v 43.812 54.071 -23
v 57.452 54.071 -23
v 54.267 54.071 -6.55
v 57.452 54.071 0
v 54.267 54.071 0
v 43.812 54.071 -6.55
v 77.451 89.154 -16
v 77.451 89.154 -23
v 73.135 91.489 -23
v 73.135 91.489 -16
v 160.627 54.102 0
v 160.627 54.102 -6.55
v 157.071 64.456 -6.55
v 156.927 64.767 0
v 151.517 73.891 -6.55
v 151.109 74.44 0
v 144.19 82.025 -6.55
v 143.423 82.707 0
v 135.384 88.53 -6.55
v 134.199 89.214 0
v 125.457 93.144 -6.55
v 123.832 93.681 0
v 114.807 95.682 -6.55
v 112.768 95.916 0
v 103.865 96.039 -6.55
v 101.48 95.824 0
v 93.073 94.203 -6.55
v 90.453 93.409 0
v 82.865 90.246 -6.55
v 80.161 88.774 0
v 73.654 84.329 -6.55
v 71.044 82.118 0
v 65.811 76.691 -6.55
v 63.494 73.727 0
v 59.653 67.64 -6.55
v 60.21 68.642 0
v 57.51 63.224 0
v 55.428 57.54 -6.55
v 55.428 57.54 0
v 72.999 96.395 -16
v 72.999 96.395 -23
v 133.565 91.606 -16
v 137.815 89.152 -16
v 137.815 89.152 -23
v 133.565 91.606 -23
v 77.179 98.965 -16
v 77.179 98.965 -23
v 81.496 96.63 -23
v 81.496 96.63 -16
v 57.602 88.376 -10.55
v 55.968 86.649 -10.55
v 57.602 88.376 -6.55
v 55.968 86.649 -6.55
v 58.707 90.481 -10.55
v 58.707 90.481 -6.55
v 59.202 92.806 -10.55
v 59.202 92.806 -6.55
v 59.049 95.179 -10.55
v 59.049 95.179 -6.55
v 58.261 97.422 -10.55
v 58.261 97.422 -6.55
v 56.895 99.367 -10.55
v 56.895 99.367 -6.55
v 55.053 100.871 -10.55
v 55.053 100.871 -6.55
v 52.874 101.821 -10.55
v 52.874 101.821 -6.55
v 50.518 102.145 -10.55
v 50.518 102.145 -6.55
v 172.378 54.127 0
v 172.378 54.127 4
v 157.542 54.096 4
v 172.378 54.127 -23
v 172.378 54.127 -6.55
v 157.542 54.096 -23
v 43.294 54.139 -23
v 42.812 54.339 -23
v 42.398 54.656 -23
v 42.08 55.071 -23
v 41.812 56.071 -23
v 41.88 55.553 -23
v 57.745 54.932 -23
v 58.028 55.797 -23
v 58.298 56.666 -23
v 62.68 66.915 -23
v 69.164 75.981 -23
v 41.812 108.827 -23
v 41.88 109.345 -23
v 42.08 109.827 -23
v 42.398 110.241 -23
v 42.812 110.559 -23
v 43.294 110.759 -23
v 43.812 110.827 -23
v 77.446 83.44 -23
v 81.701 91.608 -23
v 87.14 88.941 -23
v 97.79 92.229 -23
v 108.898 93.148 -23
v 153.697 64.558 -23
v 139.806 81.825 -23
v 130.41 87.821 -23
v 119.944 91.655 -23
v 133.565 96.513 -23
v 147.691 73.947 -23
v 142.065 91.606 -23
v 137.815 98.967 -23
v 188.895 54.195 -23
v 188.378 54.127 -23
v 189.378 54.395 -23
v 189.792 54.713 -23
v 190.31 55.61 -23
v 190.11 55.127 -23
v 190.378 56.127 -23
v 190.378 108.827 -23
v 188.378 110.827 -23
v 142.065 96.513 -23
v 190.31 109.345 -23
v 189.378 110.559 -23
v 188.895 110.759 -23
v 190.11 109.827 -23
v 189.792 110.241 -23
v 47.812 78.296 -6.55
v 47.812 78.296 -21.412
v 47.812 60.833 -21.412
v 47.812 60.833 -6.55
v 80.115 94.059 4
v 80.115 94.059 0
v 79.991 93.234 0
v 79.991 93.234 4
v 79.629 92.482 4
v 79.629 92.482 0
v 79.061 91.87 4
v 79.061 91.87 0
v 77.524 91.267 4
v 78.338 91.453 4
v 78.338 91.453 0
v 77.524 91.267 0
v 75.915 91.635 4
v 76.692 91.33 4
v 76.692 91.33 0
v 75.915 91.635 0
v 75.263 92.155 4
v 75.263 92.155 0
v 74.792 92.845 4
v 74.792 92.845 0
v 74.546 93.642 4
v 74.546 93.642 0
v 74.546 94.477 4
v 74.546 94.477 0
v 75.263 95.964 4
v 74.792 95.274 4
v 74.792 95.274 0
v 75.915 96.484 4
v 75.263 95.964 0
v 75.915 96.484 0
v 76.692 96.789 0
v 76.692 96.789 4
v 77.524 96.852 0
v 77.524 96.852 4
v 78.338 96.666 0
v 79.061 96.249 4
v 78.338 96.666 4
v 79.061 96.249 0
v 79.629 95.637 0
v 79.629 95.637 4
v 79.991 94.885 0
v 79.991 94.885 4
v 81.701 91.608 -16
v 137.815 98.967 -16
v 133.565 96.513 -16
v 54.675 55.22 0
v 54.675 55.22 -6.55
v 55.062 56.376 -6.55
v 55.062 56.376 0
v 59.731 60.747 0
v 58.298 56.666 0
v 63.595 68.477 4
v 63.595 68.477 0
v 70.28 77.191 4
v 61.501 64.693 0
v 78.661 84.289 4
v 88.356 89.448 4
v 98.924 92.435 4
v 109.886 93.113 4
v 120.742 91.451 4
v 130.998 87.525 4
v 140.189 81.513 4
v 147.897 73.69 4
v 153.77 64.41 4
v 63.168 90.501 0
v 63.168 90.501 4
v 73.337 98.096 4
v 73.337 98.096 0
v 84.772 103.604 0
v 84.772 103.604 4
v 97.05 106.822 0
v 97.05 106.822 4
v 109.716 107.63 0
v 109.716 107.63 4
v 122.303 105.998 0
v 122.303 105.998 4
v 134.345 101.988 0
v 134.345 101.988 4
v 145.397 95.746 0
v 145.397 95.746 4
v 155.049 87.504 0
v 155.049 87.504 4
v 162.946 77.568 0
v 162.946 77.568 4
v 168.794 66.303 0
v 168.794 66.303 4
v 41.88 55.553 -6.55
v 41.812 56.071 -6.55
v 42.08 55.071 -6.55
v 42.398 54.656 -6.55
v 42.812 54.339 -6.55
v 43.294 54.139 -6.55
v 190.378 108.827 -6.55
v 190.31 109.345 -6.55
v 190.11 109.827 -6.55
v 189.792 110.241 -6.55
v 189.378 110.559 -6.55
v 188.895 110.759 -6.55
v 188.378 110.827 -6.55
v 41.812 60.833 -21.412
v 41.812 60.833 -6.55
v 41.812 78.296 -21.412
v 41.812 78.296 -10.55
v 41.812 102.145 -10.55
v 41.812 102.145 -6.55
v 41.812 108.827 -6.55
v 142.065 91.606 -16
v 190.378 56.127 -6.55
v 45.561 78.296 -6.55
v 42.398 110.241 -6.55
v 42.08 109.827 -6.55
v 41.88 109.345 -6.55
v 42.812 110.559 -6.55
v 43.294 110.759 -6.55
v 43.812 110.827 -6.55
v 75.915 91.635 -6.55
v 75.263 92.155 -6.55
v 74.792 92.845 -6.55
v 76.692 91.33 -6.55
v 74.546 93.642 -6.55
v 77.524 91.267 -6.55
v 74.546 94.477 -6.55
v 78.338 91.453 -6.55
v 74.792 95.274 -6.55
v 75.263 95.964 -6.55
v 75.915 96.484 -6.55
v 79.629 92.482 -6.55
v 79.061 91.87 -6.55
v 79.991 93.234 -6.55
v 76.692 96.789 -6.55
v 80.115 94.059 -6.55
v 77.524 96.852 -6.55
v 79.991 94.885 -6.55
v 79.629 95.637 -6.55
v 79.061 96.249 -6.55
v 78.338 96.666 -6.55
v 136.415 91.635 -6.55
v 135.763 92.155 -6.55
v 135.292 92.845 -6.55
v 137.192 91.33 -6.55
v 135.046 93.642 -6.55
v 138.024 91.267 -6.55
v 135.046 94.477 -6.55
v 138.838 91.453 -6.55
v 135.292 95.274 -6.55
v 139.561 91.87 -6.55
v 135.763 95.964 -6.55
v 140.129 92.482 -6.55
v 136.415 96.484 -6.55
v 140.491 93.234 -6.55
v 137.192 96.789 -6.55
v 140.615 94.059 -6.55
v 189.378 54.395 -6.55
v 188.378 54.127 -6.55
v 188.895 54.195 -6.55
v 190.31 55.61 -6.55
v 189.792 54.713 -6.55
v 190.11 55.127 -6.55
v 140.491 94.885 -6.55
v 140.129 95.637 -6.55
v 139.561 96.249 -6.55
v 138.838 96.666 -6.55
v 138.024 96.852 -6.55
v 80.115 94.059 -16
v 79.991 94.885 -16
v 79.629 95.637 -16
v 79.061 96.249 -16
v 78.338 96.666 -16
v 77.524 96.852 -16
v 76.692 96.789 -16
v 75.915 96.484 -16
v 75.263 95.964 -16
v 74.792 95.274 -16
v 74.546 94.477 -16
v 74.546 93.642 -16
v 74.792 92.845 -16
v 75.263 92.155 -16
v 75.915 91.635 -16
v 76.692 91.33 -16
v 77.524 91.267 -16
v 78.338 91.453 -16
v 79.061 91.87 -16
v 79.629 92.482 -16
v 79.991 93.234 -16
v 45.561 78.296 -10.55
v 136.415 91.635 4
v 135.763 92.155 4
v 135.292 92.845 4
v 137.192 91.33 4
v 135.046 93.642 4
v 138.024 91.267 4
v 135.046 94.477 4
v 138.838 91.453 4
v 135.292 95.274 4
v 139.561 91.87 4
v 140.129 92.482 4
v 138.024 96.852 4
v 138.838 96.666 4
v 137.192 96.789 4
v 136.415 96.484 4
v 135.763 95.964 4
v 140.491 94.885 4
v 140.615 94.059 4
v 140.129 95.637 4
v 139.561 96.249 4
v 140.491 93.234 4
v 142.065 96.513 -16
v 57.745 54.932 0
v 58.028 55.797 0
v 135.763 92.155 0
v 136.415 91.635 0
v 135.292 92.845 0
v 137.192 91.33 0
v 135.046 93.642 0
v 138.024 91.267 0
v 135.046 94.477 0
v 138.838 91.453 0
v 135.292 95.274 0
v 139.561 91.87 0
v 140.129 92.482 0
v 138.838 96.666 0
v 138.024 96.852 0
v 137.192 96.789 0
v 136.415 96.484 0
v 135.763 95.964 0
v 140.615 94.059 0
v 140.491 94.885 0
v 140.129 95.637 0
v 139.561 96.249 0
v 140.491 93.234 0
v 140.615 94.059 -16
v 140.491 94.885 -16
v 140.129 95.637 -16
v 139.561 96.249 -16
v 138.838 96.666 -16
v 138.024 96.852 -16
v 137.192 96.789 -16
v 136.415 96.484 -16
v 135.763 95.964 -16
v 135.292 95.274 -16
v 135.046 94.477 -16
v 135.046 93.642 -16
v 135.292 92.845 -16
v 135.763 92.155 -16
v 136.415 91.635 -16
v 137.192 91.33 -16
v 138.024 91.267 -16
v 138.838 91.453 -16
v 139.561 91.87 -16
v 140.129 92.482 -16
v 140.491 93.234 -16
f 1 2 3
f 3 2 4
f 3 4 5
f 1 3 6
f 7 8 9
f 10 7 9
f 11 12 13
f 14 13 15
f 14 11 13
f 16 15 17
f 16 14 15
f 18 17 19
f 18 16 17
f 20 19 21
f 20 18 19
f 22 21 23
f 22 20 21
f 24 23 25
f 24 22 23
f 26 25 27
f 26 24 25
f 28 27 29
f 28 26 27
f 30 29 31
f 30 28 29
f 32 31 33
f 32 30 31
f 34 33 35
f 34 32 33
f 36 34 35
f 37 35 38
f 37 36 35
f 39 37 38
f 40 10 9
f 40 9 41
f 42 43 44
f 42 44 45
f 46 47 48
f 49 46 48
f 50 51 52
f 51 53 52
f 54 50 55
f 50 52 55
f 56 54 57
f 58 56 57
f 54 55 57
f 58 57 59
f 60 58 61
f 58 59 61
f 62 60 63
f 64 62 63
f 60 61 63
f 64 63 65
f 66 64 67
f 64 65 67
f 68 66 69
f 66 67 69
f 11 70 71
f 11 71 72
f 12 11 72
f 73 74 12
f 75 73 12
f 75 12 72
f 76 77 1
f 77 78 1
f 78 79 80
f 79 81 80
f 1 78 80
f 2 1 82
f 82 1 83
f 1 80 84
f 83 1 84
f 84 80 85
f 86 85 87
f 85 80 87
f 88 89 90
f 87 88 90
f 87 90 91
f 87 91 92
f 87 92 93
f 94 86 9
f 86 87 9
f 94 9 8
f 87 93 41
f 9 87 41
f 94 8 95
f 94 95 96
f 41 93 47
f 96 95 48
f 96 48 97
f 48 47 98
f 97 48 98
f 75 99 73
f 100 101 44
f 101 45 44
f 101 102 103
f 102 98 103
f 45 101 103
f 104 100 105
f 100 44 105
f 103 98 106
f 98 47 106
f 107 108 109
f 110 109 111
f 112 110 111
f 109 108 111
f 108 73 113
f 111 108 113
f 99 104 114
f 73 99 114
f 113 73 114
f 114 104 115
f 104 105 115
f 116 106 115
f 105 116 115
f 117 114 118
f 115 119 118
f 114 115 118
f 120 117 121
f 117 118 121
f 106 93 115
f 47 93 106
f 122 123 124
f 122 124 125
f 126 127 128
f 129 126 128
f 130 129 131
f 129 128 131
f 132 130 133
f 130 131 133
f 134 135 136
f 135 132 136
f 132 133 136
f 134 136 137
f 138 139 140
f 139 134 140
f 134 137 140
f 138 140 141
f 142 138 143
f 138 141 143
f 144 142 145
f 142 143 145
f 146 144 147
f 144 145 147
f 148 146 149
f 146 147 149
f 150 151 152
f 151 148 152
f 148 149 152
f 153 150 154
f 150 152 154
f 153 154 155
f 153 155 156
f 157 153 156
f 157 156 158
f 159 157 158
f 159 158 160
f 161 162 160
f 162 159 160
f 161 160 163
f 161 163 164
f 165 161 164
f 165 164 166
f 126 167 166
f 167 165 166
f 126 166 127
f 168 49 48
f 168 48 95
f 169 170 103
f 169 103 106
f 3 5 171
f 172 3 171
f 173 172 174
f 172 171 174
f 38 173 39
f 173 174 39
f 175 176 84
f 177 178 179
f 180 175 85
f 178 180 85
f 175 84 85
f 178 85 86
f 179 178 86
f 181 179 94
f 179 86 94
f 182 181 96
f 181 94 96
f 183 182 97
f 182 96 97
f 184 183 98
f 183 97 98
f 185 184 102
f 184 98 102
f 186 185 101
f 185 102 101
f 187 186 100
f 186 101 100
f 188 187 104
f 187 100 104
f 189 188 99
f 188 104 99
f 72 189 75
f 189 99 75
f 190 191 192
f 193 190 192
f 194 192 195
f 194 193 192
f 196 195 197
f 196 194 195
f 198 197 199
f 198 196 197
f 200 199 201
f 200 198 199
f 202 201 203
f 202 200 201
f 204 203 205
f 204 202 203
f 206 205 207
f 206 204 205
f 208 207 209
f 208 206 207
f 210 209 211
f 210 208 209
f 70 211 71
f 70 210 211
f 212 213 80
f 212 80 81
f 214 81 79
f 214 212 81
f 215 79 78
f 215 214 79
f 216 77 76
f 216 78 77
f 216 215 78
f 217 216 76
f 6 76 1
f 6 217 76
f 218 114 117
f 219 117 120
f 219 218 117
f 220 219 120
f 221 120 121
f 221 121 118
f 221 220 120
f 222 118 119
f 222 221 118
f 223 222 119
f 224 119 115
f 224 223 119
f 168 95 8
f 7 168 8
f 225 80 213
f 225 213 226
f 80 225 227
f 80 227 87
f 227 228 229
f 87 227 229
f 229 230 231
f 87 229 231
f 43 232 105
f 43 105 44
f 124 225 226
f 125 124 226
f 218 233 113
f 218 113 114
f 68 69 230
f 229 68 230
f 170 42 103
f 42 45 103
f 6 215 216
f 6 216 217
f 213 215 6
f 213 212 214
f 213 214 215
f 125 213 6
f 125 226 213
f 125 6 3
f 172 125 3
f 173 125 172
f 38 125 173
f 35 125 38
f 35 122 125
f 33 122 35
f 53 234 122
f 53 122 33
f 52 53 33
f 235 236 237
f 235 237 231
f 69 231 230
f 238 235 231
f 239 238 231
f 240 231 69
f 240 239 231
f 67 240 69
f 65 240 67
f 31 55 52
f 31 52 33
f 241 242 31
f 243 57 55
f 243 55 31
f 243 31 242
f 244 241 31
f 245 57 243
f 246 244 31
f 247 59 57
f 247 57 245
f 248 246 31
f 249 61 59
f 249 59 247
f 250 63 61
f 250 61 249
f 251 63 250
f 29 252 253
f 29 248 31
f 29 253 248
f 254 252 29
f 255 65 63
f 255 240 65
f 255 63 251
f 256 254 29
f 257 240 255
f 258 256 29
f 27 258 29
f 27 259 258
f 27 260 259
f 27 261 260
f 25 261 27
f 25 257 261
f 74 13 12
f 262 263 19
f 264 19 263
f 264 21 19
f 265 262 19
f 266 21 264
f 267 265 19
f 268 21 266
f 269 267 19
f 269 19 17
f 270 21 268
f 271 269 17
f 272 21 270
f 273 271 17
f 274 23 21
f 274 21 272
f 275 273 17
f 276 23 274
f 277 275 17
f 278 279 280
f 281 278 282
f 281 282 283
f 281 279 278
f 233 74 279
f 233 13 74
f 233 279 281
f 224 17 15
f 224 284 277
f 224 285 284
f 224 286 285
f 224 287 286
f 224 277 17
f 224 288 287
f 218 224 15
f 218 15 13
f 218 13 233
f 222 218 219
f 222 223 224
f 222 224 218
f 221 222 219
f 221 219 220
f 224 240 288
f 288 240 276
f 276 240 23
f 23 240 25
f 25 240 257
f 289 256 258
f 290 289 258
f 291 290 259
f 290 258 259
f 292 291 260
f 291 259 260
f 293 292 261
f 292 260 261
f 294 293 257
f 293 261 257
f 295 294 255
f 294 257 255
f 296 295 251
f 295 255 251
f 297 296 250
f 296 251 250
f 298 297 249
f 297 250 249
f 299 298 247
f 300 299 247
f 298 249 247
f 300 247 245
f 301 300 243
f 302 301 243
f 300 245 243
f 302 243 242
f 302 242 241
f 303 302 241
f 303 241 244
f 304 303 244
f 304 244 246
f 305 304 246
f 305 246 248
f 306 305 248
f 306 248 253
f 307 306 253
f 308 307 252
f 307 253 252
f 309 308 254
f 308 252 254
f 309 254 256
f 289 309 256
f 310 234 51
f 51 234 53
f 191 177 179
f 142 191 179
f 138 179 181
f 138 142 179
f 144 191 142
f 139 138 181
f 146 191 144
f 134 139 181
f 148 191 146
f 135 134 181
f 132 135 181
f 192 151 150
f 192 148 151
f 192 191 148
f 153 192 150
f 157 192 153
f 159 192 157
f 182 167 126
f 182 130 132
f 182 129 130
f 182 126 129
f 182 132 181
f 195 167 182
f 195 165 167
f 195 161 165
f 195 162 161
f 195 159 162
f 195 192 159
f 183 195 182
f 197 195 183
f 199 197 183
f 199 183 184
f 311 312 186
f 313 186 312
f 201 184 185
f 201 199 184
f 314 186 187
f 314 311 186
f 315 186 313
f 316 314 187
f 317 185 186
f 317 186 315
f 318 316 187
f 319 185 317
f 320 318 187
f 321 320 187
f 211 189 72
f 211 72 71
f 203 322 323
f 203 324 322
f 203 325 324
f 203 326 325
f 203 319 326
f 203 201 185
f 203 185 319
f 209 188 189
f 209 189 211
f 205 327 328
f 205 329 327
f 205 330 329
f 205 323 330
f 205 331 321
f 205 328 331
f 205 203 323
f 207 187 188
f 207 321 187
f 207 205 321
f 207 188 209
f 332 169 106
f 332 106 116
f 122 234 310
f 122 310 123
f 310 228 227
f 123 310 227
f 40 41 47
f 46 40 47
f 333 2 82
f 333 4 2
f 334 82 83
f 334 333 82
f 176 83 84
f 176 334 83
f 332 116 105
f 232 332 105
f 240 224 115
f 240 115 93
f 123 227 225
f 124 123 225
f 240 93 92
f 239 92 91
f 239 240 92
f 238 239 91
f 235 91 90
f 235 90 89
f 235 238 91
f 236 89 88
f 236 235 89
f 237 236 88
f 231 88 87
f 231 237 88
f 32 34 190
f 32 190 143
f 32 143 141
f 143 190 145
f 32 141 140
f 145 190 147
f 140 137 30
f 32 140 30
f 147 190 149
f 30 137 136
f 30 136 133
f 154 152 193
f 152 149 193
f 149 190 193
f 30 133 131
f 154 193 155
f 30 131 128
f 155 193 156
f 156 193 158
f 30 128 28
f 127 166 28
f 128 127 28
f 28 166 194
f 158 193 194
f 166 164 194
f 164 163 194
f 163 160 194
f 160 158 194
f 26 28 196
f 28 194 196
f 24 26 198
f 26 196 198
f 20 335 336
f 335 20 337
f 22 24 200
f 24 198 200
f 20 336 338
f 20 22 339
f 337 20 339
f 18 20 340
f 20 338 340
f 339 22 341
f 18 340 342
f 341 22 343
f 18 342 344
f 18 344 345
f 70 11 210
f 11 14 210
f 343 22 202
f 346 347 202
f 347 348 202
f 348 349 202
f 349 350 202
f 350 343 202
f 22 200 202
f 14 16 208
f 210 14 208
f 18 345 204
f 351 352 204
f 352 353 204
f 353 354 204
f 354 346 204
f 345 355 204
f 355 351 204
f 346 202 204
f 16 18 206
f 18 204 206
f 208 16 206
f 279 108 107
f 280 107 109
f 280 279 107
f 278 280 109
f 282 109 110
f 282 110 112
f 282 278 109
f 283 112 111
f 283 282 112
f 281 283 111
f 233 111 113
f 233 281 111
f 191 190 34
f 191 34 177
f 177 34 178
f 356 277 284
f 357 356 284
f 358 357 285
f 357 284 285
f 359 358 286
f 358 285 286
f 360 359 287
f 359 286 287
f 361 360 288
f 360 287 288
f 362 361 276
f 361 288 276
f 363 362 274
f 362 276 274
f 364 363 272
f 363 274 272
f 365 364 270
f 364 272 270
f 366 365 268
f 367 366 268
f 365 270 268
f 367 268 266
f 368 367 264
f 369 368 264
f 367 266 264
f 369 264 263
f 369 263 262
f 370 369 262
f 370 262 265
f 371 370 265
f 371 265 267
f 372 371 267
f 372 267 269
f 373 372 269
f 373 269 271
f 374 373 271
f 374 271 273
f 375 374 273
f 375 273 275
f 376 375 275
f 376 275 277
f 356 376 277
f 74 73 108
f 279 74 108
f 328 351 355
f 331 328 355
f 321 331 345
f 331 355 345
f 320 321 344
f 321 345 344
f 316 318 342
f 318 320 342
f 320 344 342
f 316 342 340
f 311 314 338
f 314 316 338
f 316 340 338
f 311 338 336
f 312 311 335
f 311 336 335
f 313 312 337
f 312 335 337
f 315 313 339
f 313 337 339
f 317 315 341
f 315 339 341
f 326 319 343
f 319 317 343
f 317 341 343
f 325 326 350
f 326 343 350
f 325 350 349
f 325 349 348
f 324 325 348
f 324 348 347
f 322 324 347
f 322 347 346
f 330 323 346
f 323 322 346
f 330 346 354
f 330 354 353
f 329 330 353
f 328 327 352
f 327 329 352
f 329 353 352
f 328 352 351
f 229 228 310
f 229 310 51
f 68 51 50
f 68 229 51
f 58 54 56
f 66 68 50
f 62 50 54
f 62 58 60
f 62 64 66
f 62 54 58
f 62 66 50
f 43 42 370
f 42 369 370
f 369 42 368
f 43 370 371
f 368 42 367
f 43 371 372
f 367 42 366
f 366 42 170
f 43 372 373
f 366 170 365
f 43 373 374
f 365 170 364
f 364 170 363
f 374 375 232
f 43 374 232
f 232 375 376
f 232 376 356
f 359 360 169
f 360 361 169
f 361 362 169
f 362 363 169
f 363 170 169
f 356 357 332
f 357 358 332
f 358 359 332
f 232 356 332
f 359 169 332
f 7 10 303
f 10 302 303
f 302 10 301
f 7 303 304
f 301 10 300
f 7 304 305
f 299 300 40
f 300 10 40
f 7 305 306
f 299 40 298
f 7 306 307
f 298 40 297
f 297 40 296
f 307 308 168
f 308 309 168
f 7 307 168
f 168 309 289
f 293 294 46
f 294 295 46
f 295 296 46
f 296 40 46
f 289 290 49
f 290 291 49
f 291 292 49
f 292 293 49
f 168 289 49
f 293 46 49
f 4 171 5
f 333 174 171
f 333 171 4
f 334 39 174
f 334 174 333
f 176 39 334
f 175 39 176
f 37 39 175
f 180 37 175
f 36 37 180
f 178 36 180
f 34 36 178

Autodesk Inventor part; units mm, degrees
ref_plane "YZ Plane" through (0, 0, 0) normal (1, 0, 0) x (0, 1, 0)
ref_plane "XZ Plane" through (0, 0, 0) normal (0, 1, 0) x (-1, 0, 0)
sketch "Sketch1" plane through (0, 0, 0) normal (0, 0, 1) x (1, 0, 0)
  arc A0 (162.0167, 39.368) -> (161.237, 51.1295) centre (107.5651, 41.6649) ccw construction
  line L0 (41.1768, 101.6649) -> (144.3643, 101.6649) construction
  circle A1 centre (63.4018, 101.6649) radius 1.75 construction
  line L1 (63.4018, 133.6649) -> (63.4018, 101.6649) construction
  circle A2 centre (107.4018, 101.6649) radius 1.75 construction
  circle A3 centre (151.4018, 101.6649) radius 1.75 construction
  line L2 (151.4018, 133.6649) -> (151.4018, 101.6649) construction
  circle A4 centre (107.5651, 41.6649) radius 50.5415 construction
  line L3 (52.1155, 51.1295) -> (173.6061, 51.1295) construction
  arc A5 (54.2668, 54.0707) -> (55.4284, 57.5398) centre (-8.1112, 76.8868) ccw
  arc A6 (160.627, 54.1023) -> (55.4284, 57.5398) centre (107.5651, 41.6649) ccw
  arc A7 (57.452, 54.0707) -> (58.2983, 56.666) centre (-8.1112, 76.8868) ccw
  arc A8 (157.5424, 54.0957) -> (58.2983, 56.666) centre (107.5651, 41.6649) ccw
  line L4 (172.3778, 54.1273) -> (157.5424, 54.0957)
  line L5 (57.452, 54.0707) -> (43.812, 54.0707)
  arc A9 (172.3778, 54.1273) -> (42.7416, 54.0707) centre (107.5651, 41.6649) ccw
  circle A10 centre (77.3151, 94.0594) radius 2.8
  line L6 (107.5651, 41.6649) -> (77.3151, 94.0594) construction
  line L7 (107.5651, 41.6649) -> (140.5651, 98.8225) construction
  circle A11 centre (137.8151, 94.0594) radius 2.8
  line L8 (63.1685, 103.3992) -> (63.1685, 99.9305)
  line L9 (63.1685, 90.5007) -> (63.5954, 68.4773)
  line L10 (47.625, 54.0707) -> (47.625, 69.2906)
  line L11 (77.1794, 98.965) -> (81.4957, 96.6297)
  line L12 (81.4957, 96.6297) -> (81.7008, 91.6075)
  line L13 (81.7008, 91.6075) -> (77.4508, 89.1538)
  line L14 (77.4508, 89.1538) -> (73.1346, 91.4891)
  line L15 (73.1346, 91.4891) -> (72.9989, 96.3947)
  line L16 (72.9989, 96.3947) -> (77.1794, 98.965)
  line L17 (137.8151, 89.1519) -> (133.5651, 91.6057)
  line L18 (133.5651, 91.6057) -> (133.5651, 96.5131)
  line L19 (133.5651, 96.5131) -> (137.8151, 98.9669)
  line L20 (137.8151, 98.9669) -> (142.0651, 96.5131)
  line L21 (142.0651, 96.5131) -> (142.0651, 91.6057)
  line L22 (142.0651, 91.6057) -> (137.8151, 89.1519)
  line L23 (41.1685, 300.9746) -> (41.1685, 51.9316)
  line L24 (172.3778, 54.1273) -> (188.3778, 54.1273)
  line L25 (172.3778, 54.1273) -> (188.3778, 54.1273) construction
  line L26 (190.3778, 56.1273) -> (190.3778, 108.8269)
  line L27 (188.3778, 110.8269) -> (43.812, 110.8269)
  line L28 (41.812, 56.0707) -> (41.812, 108.8269)
  arc A12 (41.812, 56.0707) -> (43.812, 54.0707) centre (43.812, 56.0707) ccw
  arc A13 (43.812, 110.8269) -> (41.812, 108.8269) centre (43.812, 108.8269) ccw
  arc A14 (190.3778, 108.8269) -> (188.3778, 110.8269) centre (188.3778, 108.8269) ccw
  arc A15 (188.3778, 54.1273) -> (190.3778, 56.1273) centre (188.3778, 56.1273) ccw
  arc A16 (55.9681, 86.6488) -> (50.5185, 102.1453) centre (50.5185, 93.4388) ccw
  line L29 (50.5185, 102.1453) -> (41.812, 102.1453)
  line L30 (41.812, 75.287) -> (55.9681, 86.6488)
  circle A17 centre (50.5185, 93.4388) radius 4.75
  point P0 (0, 0)
  point P1 (107.4018, 133.6649)
  point P2 (190.3778, 54.1273)
  dimension "d18" = 54.5
  dimension "d21" = 3.5
  dimension "d23" = 3.5
  dimension "d24" = 3.5
  dimension "d28" = 60
  dimension "d29" = 3
  dimension "d30" = 5.6
  dimension "d31" = 60.5
  dimension "d32" = 132
  dimension "d33" = 60
  dimension "d34" = 60
  dimension "d35" = 5.6
  dimension "d36" = 60.5
  dimension "d42" = 54.5
  dimension "d49" = 8.5
  dimension "d50" = 8.5
  dimension "d53" = 18
  dimension "d54" = 0
  dimension "d55" = 2
extrude "Extrusion1" add sketch "Sketch1" along normal blind 4 contours L9 A9 L4 A6 | A6 L4 A8 L9 | L11 L12 L13 L14 L15 L16 | L17 L18 L19 L20 L21 L22
extrude "Extrusion2" add sketch "Sketch1" against normal blind 23 contours A5 A6 L9 A8 A7 L5 | A6 L4 A8 L9
ref_plane "Work Plane1" through (0, 0, -6.55) normal (0, 0, -1) x (-1, 0, 0)
extrude "Extrusion3" add sketch "Sketch1" against normal up to surface (16.45 mm away) from surface at -6.55 contours L5 L10 A9 L9 A6 A5 | L5 A12 A9 L10 | L9 A9 L4 A6 | A9 A12 L28 L30 A16 L29 A13 L27 A14 L26 A15 L24 | L28 L29 A16 L30 | L11 L12 L13 L14 L15 L16 | L17 L18 L19 L20 L21 L22 | A17
extrude "Extrusion5" cut sketch "Sketch1" along normal blind 7 from surface at -23 contours L11 L12 L13 L14 L15 L16 | L17 L18 L19 L20 L21 L22
sketch "Sketch3" plane through (41.812, 56.0707, -23) normal (-1, 0, 0) x (0, 0, 1)
  circle A0 centre (7.5, 13.7262) radius 3 projected
  line L0 (16.45, 22.225) -> (1.5875, 22.225)
  line L1 (1.5875, 22.225) -> (1.5875, 4.7625)
  line L2 (1.5875, 4.7625) -> (16.45, 4.7625)
  line L3 (16.45, 4.7625) -> (16.45, 22.225)
  line L4 (16.45, 52.7561) -> (16.45, 0) projected
  point P0 (23, -56.0707)
extrude "Extrusion6" cut sketch "Sketch3" against normal blind 6 contours A0 | L3 L2 L1 L0
extrude "Extrusion7" cut sketch "Sketch1" against normal blind 4 from surface at -6.55 contours L28 L29 A16 L30 | A17
equation "\"d36\" = d31"
properties part number "Intake Shroud"
